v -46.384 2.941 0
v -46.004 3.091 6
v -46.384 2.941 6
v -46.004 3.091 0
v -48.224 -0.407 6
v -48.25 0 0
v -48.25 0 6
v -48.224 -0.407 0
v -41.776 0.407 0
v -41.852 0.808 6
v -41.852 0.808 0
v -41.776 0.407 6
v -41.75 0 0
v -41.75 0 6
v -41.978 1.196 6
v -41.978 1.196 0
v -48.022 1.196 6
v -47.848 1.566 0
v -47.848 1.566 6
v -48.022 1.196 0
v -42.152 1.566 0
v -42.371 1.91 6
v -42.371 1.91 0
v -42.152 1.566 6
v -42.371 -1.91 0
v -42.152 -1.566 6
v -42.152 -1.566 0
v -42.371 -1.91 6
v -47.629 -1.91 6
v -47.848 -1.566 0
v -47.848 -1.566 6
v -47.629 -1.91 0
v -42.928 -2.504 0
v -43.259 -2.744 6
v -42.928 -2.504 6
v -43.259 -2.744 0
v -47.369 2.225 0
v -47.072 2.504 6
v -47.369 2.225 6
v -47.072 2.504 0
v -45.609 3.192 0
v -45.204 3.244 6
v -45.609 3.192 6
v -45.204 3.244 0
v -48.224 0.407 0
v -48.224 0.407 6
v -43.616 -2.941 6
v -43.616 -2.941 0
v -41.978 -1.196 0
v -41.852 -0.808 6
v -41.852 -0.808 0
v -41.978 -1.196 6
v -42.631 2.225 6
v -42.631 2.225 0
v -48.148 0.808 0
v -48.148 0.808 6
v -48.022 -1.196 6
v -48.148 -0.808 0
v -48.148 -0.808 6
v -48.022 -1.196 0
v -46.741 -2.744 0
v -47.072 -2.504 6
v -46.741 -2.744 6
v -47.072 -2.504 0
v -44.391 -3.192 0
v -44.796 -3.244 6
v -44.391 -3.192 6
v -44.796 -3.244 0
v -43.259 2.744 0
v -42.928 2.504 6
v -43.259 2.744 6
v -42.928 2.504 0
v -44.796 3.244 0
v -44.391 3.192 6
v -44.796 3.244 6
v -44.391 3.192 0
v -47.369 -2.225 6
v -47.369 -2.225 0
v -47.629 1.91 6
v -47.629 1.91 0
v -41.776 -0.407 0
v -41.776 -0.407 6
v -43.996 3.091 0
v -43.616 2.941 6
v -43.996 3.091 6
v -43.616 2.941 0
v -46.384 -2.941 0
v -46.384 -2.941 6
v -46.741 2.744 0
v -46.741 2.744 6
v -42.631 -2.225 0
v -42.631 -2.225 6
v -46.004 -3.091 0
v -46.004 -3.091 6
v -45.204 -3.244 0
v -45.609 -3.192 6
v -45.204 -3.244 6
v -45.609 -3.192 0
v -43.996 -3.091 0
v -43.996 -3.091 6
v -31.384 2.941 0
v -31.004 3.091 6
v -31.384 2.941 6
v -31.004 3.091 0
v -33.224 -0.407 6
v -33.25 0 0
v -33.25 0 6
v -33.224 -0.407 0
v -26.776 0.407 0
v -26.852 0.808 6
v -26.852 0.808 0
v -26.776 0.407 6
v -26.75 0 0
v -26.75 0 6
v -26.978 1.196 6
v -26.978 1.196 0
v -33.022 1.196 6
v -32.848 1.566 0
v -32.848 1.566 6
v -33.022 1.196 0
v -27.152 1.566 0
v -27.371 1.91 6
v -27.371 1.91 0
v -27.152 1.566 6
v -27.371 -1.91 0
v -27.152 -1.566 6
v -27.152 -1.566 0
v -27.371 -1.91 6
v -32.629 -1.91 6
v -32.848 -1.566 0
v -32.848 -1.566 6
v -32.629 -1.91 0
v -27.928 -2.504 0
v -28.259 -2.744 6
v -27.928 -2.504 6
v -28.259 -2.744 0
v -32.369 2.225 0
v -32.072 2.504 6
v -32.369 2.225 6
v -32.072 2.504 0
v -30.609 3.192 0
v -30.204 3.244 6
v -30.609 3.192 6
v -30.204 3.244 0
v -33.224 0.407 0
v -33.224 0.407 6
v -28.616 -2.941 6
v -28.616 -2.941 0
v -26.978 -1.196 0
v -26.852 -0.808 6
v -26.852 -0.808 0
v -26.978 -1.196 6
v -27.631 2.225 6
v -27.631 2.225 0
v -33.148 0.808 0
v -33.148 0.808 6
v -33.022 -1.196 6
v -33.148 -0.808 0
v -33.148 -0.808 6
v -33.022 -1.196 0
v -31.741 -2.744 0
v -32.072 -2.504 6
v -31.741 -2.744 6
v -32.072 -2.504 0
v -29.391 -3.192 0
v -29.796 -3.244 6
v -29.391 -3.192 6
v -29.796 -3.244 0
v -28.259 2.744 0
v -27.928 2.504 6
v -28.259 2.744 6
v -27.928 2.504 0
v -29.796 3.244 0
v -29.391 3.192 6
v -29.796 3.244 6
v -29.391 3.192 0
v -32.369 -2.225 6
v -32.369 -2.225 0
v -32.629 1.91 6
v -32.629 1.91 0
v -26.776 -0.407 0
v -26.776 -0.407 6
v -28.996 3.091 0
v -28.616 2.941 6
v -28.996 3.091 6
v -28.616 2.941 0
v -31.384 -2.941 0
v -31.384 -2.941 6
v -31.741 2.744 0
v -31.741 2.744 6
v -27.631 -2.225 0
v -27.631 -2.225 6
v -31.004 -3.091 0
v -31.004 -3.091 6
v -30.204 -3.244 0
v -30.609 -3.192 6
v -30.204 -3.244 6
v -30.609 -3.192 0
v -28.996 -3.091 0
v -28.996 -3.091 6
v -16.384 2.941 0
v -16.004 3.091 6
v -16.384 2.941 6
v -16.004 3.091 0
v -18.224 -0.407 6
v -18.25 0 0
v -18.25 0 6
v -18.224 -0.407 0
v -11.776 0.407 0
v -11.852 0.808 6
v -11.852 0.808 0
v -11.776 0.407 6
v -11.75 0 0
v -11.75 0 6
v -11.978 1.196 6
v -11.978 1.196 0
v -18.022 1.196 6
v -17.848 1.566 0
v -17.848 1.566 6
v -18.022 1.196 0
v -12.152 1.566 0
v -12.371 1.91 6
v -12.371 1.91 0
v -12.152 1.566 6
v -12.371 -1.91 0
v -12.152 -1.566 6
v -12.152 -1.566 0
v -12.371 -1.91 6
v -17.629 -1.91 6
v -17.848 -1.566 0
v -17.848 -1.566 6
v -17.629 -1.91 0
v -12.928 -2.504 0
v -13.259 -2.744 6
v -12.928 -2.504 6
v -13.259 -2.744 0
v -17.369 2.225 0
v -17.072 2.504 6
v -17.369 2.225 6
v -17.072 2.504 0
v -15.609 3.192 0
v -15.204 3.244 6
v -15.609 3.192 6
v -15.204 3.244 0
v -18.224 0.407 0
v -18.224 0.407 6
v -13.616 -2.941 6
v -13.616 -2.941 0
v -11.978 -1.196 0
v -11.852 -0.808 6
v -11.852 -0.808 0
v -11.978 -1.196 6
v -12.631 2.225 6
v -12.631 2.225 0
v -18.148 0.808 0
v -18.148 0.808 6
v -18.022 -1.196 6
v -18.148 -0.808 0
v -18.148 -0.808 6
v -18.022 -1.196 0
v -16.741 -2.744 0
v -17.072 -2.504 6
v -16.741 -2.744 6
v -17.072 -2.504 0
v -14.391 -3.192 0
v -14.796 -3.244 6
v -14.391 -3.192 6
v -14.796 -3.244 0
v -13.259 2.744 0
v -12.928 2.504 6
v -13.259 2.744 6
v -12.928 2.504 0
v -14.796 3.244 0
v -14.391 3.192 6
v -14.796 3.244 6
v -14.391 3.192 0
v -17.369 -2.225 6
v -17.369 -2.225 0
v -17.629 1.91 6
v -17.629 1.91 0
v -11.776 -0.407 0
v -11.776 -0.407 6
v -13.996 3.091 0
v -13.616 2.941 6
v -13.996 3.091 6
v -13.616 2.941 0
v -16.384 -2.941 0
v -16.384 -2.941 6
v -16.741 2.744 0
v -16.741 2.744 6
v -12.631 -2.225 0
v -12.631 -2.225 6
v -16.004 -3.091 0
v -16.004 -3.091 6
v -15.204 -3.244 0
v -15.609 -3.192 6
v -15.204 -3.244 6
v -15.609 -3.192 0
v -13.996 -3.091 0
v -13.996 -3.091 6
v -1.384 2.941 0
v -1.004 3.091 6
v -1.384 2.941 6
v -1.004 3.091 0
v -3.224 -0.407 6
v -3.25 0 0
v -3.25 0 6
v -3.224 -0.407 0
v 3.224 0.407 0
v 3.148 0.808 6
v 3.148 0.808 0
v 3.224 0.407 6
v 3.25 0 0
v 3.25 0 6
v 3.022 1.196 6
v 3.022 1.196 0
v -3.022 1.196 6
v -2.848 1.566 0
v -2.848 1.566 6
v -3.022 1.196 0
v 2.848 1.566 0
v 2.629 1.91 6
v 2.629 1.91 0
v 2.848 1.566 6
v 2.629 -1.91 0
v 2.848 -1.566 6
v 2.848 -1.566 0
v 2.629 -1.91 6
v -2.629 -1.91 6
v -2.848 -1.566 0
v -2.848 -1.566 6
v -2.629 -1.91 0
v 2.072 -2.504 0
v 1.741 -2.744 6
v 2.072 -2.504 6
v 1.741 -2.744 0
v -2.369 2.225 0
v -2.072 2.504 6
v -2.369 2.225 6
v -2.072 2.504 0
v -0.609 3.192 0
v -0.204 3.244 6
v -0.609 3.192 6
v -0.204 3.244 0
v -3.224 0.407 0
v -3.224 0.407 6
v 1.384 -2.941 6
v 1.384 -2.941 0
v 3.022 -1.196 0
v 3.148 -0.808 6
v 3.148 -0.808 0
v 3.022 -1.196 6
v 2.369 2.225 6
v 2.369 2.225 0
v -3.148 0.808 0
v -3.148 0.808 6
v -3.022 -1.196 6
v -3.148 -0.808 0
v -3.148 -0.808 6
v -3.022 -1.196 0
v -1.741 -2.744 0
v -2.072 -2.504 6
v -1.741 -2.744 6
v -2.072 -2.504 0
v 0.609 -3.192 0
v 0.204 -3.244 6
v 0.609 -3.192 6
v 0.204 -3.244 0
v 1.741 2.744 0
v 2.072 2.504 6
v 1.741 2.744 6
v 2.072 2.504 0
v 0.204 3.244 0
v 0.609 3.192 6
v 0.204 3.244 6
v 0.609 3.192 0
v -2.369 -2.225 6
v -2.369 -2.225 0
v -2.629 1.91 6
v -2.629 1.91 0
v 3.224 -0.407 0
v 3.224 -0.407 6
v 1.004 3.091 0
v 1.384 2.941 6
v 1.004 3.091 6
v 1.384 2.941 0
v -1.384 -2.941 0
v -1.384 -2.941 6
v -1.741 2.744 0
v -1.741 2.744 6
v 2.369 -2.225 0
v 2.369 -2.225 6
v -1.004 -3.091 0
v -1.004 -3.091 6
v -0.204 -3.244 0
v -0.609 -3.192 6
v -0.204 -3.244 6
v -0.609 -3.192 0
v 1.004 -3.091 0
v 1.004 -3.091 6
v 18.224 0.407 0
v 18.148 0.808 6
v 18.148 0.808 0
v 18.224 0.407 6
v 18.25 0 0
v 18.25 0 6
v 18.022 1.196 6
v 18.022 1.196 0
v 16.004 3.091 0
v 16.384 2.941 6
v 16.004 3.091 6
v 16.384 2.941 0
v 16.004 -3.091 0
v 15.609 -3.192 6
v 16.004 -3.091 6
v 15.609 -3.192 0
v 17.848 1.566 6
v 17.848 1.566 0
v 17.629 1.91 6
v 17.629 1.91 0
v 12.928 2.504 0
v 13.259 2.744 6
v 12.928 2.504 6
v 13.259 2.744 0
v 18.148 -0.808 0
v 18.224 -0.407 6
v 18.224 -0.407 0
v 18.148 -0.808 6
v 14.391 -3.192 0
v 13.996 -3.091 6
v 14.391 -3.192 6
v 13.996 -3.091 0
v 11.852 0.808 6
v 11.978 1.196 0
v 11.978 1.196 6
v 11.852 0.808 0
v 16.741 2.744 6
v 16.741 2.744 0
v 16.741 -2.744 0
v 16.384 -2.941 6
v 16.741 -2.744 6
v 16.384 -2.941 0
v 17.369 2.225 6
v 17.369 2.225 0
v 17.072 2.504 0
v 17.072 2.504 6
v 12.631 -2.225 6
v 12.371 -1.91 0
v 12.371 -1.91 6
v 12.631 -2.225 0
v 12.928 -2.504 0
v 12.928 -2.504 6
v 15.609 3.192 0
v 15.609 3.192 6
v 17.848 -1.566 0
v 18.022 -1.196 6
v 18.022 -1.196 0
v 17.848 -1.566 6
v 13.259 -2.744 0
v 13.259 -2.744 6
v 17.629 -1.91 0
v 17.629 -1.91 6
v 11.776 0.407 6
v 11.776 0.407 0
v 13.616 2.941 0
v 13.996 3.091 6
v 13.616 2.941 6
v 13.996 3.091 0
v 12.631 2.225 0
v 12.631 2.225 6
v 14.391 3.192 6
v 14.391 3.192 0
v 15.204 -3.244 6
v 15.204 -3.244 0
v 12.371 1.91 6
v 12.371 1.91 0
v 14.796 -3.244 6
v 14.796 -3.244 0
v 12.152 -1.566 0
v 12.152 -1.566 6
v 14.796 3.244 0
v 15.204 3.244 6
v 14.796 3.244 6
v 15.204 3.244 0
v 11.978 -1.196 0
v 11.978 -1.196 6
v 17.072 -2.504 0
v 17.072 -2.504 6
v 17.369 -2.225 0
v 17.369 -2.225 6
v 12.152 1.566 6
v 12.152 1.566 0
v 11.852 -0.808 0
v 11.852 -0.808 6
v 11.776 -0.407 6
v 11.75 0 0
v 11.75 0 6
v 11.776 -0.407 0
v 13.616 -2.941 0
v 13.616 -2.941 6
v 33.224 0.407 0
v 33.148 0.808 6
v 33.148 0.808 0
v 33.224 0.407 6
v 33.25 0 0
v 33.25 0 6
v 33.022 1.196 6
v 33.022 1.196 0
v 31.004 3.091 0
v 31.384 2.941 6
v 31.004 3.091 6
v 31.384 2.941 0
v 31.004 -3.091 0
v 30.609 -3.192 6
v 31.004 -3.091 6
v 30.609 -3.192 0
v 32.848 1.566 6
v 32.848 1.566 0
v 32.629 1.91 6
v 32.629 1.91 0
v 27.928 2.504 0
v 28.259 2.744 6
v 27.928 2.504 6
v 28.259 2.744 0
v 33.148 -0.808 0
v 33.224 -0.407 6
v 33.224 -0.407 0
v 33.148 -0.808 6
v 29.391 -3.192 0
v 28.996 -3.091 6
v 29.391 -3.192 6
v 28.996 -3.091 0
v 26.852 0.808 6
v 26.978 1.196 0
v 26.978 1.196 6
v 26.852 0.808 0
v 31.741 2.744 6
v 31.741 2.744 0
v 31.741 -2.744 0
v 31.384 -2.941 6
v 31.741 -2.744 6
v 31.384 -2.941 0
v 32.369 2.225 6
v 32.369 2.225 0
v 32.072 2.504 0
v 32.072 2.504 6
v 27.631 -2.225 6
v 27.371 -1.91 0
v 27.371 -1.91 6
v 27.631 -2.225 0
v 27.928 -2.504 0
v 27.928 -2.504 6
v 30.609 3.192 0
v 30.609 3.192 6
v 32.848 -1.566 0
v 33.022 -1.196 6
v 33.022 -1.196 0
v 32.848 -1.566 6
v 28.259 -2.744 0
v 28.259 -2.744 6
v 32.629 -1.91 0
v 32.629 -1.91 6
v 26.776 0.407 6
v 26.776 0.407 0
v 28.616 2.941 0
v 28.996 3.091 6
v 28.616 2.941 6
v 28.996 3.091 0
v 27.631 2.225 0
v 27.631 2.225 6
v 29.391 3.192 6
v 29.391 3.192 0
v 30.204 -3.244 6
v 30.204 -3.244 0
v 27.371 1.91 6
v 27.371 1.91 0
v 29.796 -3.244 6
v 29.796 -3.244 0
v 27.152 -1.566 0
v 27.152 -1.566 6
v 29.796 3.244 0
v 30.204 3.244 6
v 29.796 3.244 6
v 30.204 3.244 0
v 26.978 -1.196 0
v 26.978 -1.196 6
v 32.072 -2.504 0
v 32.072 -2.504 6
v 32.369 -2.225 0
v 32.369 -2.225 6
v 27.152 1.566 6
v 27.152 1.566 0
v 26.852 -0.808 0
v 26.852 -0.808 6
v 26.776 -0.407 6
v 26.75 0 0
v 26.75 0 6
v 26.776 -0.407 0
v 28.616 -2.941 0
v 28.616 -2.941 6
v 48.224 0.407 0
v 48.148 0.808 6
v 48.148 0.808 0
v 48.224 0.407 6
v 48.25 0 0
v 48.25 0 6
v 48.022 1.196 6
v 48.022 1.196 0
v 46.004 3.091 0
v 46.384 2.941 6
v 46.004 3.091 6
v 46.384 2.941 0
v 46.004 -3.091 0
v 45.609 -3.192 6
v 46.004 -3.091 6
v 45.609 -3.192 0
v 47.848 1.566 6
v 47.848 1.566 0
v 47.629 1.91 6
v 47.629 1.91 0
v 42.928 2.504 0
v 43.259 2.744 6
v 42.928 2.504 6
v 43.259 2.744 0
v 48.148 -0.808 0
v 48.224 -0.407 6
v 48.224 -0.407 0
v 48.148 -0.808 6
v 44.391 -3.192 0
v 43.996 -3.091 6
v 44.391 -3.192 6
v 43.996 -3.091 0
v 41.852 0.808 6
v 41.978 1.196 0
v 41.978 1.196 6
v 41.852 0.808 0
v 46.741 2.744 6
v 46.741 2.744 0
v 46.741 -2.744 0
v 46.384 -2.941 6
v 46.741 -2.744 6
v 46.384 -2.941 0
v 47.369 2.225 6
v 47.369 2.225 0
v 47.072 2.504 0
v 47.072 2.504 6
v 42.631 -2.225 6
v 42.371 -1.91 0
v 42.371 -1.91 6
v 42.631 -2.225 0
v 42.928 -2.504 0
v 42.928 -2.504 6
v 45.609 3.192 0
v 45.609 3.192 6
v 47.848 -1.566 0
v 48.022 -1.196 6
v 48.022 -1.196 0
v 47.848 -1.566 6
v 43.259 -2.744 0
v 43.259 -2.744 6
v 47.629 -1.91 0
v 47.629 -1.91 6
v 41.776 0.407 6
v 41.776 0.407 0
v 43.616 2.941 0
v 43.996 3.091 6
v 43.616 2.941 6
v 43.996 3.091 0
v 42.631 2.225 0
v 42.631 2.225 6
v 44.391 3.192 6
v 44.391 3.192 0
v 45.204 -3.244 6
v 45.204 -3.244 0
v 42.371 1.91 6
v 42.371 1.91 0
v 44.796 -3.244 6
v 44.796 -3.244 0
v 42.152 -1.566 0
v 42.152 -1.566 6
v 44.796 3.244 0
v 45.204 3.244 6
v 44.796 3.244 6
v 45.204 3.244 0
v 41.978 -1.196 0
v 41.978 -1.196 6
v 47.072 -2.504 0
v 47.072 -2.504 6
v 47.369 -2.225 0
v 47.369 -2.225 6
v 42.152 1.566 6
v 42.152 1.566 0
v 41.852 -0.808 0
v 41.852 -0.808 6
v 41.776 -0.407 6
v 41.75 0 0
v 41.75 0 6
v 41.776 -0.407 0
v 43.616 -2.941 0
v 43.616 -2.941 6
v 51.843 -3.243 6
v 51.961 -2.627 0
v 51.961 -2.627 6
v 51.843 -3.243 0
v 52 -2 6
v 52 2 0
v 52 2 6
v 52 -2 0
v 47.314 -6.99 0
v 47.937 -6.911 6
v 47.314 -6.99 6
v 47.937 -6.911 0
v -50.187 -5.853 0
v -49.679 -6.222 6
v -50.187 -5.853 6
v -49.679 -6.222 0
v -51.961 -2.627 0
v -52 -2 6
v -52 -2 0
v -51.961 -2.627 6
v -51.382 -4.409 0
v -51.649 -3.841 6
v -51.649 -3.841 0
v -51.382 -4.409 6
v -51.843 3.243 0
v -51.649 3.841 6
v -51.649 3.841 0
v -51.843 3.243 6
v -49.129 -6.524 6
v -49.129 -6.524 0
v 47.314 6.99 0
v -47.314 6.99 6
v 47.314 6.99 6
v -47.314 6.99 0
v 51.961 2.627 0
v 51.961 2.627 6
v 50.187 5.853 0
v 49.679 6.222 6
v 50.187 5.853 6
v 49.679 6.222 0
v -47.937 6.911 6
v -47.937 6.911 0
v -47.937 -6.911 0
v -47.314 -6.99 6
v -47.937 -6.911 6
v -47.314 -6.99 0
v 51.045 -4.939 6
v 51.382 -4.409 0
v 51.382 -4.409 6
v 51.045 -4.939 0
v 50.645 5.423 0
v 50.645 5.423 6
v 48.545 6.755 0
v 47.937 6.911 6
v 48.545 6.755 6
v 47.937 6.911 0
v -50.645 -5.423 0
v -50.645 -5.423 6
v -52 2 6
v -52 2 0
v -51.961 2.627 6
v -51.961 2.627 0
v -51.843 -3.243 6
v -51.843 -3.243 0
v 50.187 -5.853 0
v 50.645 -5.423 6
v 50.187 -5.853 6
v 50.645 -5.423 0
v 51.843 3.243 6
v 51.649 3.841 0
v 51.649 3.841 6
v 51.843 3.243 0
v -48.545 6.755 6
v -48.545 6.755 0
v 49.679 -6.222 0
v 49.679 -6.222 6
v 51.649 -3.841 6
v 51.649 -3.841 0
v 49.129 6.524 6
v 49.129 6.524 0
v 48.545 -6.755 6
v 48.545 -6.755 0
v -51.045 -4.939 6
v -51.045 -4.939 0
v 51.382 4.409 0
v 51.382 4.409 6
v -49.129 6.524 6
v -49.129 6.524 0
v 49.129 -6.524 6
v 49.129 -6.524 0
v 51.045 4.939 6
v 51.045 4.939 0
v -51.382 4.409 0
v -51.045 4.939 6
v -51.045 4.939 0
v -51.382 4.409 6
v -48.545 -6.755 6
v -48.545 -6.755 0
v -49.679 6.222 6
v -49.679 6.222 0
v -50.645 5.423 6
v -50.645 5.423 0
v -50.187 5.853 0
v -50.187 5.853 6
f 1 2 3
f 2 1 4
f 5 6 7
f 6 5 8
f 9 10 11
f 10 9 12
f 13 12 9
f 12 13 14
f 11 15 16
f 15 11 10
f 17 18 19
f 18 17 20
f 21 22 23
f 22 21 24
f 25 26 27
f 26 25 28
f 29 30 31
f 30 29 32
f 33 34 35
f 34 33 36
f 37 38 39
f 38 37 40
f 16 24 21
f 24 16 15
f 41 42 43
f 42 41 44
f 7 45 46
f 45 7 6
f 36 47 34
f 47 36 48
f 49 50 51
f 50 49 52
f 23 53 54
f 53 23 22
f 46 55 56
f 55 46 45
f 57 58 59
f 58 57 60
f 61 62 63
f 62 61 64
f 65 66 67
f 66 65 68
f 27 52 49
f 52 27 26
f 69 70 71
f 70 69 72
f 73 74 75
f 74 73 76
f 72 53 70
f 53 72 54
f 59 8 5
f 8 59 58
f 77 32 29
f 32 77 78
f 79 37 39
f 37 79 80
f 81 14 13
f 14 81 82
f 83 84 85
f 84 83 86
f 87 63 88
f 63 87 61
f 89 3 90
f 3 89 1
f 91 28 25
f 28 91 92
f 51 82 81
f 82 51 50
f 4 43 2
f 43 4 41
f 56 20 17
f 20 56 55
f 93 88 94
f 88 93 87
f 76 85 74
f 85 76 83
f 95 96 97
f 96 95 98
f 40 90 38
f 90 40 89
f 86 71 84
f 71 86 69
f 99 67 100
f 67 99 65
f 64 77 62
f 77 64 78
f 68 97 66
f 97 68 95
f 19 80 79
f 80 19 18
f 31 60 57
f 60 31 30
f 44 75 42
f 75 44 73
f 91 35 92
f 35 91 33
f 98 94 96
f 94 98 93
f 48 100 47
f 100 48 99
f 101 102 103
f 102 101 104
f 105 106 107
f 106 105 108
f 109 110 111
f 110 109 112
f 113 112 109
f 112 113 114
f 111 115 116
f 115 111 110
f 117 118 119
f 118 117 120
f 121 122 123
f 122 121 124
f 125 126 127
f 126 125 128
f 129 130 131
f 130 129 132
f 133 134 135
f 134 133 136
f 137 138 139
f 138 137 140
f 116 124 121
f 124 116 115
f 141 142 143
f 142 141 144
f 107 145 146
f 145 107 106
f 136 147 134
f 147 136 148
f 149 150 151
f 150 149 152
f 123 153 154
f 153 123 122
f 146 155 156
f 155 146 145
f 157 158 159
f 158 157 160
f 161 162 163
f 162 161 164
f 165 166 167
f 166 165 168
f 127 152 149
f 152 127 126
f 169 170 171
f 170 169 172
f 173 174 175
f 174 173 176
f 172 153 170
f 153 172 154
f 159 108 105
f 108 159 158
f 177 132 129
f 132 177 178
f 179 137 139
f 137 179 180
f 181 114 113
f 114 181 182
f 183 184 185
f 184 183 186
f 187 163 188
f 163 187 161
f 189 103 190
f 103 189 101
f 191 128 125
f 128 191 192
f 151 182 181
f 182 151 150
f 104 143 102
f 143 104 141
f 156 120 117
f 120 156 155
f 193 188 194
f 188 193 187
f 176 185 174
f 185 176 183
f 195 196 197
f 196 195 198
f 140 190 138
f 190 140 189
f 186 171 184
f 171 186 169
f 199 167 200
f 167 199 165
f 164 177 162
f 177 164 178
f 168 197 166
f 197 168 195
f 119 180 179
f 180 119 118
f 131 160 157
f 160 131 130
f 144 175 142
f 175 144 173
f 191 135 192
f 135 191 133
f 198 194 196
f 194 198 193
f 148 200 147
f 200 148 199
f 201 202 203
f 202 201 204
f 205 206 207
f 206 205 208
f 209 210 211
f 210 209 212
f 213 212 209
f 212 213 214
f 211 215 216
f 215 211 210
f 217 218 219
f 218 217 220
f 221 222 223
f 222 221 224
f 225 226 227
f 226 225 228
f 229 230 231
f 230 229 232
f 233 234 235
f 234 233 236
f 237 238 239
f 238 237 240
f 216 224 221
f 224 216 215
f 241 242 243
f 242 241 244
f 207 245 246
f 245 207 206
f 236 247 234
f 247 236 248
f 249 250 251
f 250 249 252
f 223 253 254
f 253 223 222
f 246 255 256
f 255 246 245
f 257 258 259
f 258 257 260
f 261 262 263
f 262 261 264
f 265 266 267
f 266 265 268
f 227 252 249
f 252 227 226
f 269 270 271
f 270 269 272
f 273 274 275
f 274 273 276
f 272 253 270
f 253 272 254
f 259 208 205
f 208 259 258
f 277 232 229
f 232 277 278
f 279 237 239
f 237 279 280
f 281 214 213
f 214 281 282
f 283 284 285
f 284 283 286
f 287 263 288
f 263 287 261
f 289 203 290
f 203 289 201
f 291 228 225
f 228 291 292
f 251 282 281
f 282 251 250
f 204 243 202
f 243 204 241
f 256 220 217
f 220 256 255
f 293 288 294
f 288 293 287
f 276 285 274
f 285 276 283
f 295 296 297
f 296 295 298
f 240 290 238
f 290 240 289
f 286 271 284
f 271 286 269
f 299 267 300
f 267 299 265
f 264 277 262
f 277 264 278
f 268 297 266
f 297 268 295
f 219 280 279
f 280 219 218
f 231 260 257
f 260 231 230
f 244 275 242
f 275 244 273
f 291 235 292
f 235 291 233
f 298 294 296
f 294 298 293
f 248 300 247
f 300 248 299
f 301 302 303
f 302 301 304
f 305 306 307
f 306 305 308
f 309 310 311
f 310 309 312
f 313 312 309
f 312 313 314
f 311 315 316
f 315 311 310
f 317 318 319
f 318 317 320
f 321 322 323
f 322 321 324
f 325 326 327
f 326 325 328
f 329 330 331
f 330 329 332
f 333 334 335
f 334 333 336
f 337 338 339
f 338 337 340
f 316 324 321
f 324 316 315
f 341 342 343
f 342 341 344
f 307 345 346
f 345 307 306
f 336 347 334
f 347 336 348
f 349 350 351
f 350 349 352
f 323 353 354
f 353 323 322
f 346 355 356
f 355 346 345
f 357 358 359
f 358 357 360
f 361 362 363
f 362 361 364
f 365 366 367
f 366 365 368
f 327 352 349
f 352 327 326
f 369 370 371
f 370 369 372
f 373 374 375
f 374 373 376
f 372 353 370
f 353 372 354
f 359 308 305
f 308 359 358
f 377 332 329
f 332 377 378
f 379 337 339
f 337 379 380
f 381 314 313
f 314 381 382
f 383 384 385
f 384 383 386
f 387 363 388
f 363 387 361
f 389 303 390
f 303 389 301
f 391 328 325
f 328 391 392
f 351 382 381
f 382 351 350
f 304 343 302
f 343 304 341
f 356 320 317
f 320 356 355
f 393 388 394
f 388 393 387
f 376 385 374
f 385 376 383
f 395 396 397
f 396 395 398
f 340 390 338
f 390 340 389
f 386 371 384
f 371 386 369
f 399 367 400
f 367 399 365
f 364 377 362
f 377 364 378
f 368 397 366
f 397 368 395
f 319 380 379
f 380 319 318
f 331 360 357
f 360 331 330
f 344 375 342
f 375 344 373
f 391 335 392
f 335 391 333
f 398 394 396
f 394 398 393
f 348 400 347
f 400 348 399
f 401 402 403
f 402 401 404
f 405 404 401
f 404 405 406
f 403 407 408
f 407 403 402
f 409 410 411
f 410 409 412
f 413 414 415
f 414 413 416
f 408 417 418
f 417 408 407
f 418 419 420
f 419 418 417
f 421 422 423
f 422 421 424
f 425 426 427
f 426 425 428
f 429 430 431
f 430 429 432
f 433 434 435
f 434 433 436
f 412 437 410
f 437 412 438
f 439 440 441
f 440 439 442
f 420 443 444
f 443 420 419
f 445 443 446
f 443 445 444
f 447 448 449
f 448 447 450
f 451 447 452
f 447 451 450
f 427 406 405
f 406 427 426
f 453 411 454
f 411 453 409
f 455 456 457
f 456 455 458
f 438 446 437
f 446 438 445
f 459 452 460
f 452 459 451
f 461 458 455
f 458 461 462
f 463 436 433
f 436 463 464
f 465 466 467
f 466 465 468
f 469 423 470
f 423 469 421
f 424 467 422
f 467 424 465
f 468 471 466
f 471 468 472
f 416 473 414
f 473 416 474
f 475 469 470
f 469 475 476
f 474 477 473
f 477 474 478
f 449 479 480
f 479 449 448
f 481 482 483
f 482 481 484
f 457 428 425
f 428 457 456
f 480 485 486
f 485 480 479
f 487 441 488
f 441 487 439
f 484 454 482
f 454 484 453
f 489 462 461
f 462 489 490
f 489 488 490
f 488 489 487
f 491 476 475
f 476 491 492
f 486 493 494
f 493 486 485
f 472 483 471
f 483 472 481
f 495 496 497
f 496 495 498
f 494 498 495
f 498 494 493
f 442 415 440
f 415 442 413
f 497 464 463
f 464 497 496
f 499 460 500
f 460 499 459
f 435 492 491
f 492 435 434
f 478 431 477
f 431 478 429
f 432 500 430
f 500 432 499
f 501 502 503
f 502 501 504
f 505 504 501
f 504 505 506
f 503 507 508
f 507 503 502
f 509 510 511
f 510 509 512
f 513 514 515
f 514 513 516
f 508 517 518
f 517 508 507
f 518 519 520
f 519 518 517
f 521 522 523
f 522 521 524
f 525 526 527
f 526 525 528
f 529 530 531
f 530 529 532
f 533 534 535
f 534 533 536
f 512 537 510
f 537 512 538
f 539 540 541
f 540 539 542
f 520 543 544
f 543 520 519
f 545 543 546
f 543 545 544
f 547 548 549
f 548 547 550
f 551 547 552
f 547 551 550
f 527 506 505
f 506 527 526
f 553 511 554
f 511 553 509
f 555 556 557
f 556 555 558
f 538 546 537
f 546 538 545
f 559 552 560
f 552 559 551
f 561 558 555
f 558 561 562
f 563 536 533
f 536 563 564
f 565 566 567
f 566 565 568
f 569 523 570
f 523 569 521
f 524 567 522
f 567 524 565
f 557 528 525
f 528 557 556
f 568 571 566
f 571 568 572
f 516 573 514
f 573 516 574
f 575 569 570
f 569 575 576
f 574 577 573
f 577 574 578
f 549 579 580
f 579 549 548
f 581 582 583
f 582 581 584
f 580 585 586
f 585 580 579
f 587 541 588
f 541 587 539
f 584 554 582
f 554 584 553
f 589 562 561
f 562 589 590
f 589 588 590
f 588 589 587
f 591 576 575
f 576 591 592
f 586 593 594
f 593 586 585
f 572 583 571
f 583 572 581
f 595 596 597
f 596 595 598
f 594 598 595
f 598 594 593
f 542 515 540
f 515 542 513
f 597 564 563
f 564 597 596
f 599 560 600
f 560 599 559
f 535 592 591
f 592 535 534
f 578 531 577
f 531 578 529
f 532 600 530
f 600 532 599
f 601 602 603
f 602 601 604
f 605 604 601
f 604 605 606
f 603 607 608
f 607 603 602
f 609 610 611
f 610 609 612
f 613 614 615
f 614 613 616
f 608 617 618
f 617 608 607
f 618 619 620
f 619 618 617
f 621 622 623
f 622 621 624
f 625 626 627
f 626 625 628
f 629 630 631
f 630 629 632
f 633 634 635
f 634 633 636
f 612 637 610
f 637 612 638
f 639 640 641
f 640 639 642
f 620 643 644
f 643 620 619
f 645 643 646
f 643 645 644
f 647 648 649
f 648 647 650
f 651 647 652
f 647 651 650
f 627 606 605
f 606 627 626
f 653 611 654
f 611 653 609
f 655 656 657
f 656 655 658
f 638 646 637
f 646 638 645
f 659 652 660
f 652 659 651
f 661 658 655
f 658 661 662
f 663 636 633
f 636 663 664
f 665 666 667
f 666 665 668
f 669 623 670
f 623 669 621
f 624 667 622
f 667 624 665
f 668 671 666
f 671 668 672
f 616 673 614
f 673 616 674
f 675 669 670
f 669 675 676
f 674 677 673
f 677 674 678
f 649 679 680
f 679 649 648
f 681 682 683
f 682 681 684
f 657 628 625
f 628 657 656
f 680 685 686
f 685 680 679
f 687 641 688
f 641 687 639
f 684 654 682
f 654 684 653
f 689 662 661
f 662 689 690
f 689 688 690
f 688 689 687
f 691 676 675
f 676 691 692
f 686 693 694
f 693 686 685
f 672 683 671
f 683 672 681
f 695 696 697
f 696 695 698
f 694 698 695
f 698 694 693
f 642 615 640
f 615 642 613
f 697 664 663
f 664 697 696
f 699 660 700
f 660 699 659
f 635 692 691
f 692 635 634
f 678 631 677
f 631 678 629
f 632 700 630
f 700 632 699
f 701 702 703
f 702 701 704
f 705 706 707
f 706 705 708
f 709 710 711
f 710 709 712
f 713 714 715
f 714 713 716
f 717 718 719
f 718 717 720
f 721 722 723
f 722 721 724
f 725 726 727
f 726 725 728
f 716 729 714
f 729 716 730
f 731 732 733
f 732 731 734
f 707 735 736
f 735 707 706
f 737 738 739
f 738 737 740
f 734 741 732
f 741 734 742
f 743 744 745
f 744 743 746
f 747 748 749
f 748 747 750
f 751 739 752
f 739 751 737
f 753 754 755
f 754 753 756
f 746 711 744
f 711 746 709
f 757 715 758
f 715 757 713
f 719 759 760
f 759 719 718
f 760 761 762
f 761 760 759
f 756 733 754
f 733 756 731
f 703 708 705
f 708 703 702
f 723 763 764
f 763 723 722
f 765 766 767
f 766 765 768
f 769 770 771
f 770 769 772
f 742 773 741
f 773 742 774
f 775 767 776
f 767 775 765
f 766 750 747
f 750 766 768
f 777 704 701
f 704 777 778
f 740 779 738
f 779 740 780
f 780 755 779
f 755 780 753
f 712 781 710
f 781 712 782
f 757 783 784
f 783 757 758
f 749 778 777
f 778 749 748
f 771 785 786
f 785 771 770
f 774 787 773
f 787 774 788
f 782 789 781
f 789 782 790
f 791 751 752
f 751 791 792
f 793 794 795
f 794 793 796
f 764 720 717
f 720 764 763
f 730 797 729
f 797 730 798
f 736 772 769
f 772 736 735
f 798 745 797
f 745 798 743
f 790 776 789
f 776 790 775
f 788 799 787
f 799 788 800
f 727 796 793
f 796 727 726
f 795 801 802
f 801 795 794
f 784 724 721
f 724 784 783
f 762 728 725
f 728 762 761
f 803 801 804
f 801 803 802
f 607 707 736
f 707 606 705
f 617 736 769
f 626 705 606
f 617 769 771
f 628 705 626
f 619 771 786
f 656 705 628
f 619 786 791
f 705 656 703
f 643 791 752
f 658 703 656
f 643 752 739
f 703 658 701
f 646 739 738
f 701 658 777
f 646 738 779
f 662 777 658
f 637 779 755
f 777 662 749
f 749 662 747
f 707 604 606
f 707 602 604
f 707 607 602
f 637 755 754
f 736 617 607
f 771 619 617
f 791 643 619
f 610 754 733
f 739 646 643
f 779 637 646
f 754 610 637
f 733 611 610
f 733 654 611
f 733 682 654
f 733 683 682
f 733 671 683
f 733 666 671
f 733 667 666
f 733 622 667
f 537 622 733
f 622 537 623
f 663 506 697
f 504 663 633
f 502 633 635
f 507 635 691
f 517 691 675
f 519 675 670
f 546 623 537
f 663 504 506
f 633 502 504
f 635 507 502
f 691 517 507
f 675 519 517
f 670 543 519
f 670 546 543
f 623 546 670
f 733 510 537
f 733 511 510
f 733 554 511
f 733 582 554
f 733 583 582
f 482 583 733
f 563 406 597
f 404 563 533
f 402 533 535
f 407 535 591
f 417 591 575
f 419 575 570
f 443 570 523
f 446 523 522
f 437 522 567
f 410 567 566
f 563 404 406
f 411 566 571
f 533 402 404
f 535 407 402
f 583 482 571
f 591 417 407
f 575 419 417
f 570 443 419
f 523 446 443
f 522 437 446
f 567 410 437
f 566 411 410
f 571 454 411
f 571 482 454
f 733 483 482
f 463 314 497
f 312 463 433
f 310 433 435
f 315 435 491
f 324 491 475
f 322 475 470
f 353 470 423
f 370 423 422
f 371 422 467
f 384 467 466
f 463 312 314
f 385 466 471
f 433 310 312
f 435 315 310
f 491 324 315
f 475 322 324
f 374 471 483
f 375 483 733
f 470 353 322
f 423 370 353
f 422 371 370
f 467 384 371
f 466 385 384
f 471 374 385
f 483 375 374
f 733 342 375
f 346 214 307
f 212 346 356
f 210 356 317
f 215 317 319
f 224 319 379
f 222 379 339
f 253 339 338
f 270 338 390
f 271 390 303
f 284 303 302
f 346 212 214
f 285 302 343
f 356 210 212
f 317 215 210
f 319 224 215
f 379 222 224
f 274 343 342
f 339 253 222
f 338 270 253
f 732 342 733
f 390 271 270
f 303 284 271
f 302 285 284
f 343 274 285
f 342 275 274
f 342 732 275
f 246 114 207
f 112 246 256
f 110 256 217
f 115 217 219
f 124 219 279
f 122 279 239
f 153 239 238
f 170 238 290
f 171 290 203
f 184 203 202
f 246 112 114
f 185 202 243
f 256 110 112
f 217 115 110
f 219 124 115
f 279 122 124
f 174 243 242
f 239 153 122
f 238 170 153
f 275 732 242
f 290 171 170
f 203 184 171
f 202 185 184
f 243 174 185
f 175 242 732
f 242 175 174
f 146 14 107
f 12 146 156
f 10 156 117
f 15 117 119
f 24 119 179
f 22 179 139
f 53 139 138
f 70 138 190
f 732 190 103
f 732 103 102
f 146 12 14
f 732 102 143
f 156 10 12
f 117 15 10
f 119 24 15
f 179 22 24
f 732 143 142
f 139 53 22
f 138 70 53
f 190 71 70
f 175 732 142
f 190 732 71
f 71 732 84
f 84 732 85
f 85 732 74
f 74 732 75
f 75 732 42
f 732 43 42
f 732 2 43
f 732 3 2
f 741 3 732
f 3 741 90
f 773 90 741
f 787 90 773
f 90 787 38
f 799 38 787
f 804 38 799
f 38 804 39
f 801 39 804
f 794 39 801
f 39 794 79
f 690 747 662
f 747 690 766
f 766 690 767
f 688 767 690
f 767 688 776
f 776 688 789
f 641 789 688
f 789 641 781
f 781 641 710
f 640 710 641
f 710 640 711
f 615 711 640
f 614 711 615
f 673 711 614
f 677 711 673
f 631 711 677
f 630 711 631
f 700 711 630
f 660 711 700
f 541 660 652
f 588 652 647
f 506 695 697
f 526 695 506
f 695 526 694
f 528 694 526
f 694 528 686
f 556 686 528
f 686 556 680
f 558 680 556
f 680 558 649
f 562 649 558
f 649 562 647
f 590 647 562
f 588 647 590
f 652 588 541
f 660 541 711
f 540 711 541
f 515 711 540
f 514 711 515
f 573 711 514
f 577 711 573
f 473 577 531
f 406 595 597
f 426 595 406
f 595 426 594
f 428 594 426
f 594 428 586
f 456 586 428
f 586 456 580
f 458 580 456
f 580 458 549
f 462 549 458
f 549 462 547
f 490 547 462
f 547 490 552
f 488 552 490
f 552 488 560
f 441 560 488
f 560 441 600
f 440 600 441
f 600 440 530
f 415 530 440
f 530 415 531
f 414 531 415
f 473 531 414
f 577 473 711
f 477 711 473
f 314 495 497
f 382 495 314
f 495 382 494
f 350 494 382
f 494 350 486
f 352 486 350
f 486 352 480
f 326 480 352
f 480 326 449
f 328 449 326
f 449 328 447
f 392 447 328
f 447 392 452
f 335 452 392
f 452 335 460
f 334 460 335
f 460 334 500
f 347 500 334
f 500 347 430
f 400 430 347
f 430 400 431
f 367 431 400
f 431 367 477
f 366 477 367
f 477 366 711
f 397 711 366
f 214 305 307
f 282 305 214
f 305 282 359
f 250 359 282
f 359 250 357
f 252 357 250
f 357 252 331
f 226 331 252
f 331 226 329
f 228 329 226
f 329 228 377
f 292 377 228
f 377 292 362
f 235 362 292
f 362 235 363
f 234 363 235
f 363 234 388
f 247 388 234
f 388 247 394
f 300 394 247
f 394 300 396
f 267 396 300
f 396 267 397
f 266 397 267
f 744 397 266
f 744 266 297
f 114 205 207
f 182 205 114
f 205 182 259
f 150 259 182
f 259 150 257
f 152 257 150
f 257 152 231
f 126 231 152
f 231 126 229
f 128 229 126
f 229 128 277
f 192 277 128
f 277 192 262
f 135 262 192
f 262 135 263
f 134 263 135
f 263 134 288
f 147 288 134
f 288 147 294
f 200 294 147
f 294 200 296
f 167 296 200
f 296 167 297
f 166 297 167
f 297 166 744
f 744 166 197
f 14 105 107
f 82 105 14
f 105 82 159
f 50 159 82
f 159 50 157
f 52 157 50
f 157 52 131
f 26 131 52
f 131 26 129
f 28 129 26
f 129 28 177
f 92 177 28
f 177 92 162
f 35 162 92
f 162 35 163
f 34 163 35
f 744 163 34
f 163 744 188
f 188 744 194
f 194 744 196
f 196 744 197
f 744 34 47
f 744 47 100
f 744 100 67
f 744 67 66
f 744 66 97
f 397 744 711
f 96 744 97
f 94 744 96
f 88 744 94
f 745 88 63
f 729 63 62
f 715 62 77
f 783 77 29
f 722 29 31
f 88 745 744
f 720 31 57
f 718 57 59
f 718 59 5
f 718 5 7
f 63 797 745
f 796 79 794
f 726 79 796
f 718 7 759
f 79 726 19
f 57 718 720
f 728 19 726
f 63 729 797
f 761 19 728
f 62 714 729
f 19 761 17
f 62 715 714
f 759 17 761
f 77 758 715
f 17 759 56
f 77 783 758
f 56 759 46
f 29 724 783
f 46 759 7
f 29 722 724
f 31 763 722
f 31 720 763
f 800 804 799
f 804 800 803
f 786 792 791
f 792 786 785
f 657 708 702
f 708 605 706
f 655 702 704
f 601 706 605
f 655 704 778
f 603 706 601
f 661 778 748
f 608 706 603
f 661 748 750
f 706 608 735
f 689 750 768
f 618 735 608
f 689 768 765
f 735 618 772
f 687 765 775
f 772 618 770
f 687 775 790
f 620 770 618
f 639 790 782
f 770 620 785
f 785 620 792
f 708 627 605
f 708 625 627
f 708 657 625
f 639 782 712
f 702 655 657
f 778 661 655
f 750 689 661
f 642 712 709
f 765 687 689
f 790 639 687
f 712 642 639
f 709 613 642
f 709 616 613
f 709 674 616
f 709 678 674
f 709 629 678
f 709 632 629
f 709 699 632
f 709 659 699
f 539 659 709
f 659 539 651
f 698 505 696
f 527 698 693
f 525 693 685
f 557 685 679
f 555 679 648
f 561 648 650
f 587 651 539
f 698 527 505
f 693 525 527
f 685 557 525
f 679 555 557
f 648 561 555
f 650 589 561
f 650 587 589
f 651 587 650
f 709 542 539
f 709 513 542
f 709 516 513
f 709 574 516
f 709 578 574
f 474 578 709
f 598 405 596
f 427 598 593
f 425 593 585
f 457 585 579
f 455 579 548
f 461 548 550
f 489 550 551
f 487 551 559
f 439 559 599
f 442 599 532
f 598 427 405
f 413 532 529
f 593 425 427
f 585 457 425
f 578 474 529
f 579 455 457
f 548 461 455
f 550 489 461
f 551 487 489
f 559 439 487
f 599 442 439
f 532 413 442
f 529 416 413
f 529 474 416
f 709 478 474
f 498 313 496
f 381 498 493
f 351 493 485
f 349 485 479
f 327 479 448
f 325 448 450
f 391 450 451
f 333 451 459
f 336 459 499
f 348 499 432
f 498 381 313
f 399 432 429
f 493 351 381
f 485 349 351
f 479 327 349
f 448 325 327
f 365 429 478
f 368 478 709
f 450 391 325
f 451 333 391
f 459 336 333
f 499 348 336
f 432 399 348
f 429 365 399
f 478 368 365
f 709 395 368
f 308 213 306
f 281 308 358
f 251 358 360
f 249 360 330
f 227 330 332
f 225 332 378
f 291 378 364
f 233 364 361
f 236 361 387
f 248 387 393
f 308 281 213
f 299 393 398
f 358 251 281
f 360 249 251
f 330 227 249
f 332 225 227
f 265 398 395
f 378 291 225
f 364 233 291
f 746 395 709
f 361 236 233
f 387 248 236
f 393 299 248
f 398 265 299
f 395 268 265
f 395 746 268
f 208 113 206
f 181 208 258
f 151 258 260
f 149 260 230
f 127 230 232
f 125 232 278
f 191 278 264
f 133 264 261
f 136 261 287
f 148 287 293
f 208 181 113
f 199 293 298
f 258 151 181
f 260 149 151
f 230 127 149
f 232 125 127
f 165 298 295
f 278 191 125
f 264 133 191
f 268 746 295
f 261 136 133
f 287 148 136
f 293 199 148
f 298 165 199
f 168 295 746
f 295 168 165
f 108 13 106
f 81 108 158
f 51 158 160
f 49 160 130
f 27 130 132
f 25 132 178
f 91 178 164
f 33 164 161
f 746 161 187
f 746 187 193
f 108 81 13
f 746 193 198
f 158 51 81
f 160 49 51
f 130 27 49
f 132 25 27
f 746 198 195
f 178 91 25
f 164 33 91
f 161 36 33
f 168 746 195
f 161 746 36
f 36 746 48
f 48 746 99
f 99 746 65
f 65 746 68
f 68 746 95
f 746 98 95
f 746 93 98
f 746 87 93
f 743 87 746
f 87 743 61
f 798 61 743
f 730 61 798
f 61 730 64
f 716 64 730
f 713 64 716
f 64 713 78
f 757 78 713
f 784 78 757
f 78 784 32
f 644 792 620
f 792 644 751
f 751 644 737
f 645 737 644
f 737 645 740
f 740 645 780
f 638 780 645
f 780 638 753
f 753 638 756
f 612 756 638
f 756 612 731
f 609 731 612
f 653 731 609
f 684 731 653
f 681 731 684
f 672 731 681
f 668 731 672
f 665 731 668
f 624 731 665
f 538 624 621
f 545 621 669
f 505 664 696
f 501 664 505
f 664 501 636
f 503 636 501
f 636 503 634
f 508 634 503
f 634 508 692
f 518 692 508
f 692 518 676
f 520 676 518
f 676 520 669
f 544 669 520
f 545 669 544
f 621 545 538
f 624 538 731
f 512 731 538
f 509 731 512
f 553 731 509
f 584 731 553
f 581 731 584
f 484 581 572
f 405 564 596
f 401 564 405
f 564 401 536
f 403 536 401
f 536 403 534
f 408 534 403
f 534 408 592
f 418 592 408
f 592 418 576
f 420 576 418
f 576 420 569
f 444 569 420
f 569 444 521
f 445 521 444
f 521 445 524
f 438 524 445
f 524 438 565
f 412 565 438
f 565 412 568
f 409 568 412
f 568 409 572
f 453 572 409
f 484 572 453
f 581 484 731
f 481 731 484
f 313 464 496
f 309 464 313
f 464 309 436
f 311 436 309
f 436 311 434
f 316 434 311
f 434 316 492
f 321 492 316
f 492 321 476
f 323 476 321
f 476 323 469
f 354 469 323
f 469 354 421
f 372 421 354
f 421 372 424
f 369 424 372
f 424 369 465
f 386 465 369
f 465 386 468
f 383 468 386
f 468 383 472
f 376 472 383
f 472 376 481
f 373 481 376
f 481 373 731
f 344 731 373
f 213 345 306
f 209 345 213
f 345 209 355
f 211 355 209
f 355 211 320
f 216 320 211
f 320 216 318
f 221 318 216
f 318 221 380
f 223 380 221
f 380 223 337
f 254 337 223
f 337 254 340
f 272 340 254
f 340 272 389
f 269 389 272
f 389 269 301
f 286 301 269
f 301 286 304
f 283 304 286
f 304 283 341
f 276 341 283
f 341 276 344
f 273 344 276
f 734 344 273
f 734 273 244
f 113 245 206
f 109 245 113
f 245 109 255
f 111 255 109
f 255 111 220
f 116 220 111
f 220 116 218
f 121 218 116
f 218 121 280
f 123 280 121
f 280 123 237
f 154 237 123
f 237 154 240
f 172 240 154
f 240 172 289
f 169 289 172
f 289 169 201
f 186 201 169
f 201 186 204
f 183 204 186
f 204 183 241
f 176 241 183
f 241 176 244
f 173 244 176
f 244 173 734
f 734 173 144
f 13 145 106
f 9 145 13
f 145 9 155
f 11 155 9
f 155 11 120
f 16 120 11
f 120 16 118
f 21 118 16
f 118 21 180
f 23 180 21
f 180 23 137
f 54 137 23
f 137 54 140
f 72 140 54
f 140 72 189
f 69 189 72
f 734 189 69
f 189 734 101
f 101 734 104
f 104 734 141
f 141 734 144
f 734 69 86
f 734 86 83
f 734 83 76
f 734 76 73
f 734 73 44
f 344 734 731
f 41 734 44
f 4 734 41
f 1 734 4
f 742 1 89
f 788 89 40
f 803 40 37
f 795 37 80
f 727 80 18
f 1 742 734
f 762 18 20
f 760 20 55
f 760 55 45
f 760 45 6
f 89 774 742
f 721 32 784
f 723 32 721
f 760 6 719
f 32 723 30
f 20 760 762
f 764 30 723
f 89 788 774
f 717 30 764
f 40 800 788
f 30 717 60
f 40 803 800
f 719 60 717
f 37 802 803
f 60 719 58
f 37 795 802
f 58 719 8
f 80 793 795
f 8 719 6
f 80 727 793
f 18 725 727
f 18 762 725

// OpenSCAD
$fn = 50;


difference() {
	union() {
		hull() {
			translate(v = [-47.0000000000, 2.0000000000, 0]) {
				cylinder(h = 6, r = 5);
			}
			translate(v = [47.0000000000, 2.0000000000, 0]) {
				cylinder(h = 6, r = 5);
			}
			translate(v = [-47.0000000000, -2.0000000000, 0]) {
				cylinder(h = 6, r = 5);
			}
			translate(v = [47.0000000000, -2.0000000000, 0]) {
				cylinder(h = 6, r = 5);
			}
		}
	}
	union() {
		translate(v = [-45.0000000000, 0.0000000000, 0]) {
			translate(v = [0, 0, -100]) {
				cylinder(h = 200, r = 3.2500000000);
			}
		}
		translate(v = [-30.0000000000, 0.0000000000, 0]) {
			translate(v = [0, 0, -100]) {
				cylinder(h = 200, r = 3.2500000000);
			}
		}
		translate(v = [-15.0000000000, 0.0000000000, 0]) {
			translate(v = [0, 0, -100]) {
				cylinder(h = 200, r = 3.2500000000);
			}
		}
		translate(v = [0, 0, -100]) {
			cylinder(h = 200, r = 3.2500000000);
		}
		translate(v = [15.0000000000, 0.0000000000, 0]) {
			translate(v = [0, 0, -100]) {
				cylinder(h = 200, r = 3.2500000000);
			}
		}
		translate(v = [30.0000000000, 0.0000000000, 0]) {
			translate(v = [0, 0, -100]) {
				cylinder(h = 200, r = 3.2500000000);
			}
		}
		translate(v = [45.0000000000, 0.0000000000, 0]) {
			translate(v = [0, 0, -100]) {
				cylinder(h = 200, r = 3.2500000000);
			}
		}
	}
}
